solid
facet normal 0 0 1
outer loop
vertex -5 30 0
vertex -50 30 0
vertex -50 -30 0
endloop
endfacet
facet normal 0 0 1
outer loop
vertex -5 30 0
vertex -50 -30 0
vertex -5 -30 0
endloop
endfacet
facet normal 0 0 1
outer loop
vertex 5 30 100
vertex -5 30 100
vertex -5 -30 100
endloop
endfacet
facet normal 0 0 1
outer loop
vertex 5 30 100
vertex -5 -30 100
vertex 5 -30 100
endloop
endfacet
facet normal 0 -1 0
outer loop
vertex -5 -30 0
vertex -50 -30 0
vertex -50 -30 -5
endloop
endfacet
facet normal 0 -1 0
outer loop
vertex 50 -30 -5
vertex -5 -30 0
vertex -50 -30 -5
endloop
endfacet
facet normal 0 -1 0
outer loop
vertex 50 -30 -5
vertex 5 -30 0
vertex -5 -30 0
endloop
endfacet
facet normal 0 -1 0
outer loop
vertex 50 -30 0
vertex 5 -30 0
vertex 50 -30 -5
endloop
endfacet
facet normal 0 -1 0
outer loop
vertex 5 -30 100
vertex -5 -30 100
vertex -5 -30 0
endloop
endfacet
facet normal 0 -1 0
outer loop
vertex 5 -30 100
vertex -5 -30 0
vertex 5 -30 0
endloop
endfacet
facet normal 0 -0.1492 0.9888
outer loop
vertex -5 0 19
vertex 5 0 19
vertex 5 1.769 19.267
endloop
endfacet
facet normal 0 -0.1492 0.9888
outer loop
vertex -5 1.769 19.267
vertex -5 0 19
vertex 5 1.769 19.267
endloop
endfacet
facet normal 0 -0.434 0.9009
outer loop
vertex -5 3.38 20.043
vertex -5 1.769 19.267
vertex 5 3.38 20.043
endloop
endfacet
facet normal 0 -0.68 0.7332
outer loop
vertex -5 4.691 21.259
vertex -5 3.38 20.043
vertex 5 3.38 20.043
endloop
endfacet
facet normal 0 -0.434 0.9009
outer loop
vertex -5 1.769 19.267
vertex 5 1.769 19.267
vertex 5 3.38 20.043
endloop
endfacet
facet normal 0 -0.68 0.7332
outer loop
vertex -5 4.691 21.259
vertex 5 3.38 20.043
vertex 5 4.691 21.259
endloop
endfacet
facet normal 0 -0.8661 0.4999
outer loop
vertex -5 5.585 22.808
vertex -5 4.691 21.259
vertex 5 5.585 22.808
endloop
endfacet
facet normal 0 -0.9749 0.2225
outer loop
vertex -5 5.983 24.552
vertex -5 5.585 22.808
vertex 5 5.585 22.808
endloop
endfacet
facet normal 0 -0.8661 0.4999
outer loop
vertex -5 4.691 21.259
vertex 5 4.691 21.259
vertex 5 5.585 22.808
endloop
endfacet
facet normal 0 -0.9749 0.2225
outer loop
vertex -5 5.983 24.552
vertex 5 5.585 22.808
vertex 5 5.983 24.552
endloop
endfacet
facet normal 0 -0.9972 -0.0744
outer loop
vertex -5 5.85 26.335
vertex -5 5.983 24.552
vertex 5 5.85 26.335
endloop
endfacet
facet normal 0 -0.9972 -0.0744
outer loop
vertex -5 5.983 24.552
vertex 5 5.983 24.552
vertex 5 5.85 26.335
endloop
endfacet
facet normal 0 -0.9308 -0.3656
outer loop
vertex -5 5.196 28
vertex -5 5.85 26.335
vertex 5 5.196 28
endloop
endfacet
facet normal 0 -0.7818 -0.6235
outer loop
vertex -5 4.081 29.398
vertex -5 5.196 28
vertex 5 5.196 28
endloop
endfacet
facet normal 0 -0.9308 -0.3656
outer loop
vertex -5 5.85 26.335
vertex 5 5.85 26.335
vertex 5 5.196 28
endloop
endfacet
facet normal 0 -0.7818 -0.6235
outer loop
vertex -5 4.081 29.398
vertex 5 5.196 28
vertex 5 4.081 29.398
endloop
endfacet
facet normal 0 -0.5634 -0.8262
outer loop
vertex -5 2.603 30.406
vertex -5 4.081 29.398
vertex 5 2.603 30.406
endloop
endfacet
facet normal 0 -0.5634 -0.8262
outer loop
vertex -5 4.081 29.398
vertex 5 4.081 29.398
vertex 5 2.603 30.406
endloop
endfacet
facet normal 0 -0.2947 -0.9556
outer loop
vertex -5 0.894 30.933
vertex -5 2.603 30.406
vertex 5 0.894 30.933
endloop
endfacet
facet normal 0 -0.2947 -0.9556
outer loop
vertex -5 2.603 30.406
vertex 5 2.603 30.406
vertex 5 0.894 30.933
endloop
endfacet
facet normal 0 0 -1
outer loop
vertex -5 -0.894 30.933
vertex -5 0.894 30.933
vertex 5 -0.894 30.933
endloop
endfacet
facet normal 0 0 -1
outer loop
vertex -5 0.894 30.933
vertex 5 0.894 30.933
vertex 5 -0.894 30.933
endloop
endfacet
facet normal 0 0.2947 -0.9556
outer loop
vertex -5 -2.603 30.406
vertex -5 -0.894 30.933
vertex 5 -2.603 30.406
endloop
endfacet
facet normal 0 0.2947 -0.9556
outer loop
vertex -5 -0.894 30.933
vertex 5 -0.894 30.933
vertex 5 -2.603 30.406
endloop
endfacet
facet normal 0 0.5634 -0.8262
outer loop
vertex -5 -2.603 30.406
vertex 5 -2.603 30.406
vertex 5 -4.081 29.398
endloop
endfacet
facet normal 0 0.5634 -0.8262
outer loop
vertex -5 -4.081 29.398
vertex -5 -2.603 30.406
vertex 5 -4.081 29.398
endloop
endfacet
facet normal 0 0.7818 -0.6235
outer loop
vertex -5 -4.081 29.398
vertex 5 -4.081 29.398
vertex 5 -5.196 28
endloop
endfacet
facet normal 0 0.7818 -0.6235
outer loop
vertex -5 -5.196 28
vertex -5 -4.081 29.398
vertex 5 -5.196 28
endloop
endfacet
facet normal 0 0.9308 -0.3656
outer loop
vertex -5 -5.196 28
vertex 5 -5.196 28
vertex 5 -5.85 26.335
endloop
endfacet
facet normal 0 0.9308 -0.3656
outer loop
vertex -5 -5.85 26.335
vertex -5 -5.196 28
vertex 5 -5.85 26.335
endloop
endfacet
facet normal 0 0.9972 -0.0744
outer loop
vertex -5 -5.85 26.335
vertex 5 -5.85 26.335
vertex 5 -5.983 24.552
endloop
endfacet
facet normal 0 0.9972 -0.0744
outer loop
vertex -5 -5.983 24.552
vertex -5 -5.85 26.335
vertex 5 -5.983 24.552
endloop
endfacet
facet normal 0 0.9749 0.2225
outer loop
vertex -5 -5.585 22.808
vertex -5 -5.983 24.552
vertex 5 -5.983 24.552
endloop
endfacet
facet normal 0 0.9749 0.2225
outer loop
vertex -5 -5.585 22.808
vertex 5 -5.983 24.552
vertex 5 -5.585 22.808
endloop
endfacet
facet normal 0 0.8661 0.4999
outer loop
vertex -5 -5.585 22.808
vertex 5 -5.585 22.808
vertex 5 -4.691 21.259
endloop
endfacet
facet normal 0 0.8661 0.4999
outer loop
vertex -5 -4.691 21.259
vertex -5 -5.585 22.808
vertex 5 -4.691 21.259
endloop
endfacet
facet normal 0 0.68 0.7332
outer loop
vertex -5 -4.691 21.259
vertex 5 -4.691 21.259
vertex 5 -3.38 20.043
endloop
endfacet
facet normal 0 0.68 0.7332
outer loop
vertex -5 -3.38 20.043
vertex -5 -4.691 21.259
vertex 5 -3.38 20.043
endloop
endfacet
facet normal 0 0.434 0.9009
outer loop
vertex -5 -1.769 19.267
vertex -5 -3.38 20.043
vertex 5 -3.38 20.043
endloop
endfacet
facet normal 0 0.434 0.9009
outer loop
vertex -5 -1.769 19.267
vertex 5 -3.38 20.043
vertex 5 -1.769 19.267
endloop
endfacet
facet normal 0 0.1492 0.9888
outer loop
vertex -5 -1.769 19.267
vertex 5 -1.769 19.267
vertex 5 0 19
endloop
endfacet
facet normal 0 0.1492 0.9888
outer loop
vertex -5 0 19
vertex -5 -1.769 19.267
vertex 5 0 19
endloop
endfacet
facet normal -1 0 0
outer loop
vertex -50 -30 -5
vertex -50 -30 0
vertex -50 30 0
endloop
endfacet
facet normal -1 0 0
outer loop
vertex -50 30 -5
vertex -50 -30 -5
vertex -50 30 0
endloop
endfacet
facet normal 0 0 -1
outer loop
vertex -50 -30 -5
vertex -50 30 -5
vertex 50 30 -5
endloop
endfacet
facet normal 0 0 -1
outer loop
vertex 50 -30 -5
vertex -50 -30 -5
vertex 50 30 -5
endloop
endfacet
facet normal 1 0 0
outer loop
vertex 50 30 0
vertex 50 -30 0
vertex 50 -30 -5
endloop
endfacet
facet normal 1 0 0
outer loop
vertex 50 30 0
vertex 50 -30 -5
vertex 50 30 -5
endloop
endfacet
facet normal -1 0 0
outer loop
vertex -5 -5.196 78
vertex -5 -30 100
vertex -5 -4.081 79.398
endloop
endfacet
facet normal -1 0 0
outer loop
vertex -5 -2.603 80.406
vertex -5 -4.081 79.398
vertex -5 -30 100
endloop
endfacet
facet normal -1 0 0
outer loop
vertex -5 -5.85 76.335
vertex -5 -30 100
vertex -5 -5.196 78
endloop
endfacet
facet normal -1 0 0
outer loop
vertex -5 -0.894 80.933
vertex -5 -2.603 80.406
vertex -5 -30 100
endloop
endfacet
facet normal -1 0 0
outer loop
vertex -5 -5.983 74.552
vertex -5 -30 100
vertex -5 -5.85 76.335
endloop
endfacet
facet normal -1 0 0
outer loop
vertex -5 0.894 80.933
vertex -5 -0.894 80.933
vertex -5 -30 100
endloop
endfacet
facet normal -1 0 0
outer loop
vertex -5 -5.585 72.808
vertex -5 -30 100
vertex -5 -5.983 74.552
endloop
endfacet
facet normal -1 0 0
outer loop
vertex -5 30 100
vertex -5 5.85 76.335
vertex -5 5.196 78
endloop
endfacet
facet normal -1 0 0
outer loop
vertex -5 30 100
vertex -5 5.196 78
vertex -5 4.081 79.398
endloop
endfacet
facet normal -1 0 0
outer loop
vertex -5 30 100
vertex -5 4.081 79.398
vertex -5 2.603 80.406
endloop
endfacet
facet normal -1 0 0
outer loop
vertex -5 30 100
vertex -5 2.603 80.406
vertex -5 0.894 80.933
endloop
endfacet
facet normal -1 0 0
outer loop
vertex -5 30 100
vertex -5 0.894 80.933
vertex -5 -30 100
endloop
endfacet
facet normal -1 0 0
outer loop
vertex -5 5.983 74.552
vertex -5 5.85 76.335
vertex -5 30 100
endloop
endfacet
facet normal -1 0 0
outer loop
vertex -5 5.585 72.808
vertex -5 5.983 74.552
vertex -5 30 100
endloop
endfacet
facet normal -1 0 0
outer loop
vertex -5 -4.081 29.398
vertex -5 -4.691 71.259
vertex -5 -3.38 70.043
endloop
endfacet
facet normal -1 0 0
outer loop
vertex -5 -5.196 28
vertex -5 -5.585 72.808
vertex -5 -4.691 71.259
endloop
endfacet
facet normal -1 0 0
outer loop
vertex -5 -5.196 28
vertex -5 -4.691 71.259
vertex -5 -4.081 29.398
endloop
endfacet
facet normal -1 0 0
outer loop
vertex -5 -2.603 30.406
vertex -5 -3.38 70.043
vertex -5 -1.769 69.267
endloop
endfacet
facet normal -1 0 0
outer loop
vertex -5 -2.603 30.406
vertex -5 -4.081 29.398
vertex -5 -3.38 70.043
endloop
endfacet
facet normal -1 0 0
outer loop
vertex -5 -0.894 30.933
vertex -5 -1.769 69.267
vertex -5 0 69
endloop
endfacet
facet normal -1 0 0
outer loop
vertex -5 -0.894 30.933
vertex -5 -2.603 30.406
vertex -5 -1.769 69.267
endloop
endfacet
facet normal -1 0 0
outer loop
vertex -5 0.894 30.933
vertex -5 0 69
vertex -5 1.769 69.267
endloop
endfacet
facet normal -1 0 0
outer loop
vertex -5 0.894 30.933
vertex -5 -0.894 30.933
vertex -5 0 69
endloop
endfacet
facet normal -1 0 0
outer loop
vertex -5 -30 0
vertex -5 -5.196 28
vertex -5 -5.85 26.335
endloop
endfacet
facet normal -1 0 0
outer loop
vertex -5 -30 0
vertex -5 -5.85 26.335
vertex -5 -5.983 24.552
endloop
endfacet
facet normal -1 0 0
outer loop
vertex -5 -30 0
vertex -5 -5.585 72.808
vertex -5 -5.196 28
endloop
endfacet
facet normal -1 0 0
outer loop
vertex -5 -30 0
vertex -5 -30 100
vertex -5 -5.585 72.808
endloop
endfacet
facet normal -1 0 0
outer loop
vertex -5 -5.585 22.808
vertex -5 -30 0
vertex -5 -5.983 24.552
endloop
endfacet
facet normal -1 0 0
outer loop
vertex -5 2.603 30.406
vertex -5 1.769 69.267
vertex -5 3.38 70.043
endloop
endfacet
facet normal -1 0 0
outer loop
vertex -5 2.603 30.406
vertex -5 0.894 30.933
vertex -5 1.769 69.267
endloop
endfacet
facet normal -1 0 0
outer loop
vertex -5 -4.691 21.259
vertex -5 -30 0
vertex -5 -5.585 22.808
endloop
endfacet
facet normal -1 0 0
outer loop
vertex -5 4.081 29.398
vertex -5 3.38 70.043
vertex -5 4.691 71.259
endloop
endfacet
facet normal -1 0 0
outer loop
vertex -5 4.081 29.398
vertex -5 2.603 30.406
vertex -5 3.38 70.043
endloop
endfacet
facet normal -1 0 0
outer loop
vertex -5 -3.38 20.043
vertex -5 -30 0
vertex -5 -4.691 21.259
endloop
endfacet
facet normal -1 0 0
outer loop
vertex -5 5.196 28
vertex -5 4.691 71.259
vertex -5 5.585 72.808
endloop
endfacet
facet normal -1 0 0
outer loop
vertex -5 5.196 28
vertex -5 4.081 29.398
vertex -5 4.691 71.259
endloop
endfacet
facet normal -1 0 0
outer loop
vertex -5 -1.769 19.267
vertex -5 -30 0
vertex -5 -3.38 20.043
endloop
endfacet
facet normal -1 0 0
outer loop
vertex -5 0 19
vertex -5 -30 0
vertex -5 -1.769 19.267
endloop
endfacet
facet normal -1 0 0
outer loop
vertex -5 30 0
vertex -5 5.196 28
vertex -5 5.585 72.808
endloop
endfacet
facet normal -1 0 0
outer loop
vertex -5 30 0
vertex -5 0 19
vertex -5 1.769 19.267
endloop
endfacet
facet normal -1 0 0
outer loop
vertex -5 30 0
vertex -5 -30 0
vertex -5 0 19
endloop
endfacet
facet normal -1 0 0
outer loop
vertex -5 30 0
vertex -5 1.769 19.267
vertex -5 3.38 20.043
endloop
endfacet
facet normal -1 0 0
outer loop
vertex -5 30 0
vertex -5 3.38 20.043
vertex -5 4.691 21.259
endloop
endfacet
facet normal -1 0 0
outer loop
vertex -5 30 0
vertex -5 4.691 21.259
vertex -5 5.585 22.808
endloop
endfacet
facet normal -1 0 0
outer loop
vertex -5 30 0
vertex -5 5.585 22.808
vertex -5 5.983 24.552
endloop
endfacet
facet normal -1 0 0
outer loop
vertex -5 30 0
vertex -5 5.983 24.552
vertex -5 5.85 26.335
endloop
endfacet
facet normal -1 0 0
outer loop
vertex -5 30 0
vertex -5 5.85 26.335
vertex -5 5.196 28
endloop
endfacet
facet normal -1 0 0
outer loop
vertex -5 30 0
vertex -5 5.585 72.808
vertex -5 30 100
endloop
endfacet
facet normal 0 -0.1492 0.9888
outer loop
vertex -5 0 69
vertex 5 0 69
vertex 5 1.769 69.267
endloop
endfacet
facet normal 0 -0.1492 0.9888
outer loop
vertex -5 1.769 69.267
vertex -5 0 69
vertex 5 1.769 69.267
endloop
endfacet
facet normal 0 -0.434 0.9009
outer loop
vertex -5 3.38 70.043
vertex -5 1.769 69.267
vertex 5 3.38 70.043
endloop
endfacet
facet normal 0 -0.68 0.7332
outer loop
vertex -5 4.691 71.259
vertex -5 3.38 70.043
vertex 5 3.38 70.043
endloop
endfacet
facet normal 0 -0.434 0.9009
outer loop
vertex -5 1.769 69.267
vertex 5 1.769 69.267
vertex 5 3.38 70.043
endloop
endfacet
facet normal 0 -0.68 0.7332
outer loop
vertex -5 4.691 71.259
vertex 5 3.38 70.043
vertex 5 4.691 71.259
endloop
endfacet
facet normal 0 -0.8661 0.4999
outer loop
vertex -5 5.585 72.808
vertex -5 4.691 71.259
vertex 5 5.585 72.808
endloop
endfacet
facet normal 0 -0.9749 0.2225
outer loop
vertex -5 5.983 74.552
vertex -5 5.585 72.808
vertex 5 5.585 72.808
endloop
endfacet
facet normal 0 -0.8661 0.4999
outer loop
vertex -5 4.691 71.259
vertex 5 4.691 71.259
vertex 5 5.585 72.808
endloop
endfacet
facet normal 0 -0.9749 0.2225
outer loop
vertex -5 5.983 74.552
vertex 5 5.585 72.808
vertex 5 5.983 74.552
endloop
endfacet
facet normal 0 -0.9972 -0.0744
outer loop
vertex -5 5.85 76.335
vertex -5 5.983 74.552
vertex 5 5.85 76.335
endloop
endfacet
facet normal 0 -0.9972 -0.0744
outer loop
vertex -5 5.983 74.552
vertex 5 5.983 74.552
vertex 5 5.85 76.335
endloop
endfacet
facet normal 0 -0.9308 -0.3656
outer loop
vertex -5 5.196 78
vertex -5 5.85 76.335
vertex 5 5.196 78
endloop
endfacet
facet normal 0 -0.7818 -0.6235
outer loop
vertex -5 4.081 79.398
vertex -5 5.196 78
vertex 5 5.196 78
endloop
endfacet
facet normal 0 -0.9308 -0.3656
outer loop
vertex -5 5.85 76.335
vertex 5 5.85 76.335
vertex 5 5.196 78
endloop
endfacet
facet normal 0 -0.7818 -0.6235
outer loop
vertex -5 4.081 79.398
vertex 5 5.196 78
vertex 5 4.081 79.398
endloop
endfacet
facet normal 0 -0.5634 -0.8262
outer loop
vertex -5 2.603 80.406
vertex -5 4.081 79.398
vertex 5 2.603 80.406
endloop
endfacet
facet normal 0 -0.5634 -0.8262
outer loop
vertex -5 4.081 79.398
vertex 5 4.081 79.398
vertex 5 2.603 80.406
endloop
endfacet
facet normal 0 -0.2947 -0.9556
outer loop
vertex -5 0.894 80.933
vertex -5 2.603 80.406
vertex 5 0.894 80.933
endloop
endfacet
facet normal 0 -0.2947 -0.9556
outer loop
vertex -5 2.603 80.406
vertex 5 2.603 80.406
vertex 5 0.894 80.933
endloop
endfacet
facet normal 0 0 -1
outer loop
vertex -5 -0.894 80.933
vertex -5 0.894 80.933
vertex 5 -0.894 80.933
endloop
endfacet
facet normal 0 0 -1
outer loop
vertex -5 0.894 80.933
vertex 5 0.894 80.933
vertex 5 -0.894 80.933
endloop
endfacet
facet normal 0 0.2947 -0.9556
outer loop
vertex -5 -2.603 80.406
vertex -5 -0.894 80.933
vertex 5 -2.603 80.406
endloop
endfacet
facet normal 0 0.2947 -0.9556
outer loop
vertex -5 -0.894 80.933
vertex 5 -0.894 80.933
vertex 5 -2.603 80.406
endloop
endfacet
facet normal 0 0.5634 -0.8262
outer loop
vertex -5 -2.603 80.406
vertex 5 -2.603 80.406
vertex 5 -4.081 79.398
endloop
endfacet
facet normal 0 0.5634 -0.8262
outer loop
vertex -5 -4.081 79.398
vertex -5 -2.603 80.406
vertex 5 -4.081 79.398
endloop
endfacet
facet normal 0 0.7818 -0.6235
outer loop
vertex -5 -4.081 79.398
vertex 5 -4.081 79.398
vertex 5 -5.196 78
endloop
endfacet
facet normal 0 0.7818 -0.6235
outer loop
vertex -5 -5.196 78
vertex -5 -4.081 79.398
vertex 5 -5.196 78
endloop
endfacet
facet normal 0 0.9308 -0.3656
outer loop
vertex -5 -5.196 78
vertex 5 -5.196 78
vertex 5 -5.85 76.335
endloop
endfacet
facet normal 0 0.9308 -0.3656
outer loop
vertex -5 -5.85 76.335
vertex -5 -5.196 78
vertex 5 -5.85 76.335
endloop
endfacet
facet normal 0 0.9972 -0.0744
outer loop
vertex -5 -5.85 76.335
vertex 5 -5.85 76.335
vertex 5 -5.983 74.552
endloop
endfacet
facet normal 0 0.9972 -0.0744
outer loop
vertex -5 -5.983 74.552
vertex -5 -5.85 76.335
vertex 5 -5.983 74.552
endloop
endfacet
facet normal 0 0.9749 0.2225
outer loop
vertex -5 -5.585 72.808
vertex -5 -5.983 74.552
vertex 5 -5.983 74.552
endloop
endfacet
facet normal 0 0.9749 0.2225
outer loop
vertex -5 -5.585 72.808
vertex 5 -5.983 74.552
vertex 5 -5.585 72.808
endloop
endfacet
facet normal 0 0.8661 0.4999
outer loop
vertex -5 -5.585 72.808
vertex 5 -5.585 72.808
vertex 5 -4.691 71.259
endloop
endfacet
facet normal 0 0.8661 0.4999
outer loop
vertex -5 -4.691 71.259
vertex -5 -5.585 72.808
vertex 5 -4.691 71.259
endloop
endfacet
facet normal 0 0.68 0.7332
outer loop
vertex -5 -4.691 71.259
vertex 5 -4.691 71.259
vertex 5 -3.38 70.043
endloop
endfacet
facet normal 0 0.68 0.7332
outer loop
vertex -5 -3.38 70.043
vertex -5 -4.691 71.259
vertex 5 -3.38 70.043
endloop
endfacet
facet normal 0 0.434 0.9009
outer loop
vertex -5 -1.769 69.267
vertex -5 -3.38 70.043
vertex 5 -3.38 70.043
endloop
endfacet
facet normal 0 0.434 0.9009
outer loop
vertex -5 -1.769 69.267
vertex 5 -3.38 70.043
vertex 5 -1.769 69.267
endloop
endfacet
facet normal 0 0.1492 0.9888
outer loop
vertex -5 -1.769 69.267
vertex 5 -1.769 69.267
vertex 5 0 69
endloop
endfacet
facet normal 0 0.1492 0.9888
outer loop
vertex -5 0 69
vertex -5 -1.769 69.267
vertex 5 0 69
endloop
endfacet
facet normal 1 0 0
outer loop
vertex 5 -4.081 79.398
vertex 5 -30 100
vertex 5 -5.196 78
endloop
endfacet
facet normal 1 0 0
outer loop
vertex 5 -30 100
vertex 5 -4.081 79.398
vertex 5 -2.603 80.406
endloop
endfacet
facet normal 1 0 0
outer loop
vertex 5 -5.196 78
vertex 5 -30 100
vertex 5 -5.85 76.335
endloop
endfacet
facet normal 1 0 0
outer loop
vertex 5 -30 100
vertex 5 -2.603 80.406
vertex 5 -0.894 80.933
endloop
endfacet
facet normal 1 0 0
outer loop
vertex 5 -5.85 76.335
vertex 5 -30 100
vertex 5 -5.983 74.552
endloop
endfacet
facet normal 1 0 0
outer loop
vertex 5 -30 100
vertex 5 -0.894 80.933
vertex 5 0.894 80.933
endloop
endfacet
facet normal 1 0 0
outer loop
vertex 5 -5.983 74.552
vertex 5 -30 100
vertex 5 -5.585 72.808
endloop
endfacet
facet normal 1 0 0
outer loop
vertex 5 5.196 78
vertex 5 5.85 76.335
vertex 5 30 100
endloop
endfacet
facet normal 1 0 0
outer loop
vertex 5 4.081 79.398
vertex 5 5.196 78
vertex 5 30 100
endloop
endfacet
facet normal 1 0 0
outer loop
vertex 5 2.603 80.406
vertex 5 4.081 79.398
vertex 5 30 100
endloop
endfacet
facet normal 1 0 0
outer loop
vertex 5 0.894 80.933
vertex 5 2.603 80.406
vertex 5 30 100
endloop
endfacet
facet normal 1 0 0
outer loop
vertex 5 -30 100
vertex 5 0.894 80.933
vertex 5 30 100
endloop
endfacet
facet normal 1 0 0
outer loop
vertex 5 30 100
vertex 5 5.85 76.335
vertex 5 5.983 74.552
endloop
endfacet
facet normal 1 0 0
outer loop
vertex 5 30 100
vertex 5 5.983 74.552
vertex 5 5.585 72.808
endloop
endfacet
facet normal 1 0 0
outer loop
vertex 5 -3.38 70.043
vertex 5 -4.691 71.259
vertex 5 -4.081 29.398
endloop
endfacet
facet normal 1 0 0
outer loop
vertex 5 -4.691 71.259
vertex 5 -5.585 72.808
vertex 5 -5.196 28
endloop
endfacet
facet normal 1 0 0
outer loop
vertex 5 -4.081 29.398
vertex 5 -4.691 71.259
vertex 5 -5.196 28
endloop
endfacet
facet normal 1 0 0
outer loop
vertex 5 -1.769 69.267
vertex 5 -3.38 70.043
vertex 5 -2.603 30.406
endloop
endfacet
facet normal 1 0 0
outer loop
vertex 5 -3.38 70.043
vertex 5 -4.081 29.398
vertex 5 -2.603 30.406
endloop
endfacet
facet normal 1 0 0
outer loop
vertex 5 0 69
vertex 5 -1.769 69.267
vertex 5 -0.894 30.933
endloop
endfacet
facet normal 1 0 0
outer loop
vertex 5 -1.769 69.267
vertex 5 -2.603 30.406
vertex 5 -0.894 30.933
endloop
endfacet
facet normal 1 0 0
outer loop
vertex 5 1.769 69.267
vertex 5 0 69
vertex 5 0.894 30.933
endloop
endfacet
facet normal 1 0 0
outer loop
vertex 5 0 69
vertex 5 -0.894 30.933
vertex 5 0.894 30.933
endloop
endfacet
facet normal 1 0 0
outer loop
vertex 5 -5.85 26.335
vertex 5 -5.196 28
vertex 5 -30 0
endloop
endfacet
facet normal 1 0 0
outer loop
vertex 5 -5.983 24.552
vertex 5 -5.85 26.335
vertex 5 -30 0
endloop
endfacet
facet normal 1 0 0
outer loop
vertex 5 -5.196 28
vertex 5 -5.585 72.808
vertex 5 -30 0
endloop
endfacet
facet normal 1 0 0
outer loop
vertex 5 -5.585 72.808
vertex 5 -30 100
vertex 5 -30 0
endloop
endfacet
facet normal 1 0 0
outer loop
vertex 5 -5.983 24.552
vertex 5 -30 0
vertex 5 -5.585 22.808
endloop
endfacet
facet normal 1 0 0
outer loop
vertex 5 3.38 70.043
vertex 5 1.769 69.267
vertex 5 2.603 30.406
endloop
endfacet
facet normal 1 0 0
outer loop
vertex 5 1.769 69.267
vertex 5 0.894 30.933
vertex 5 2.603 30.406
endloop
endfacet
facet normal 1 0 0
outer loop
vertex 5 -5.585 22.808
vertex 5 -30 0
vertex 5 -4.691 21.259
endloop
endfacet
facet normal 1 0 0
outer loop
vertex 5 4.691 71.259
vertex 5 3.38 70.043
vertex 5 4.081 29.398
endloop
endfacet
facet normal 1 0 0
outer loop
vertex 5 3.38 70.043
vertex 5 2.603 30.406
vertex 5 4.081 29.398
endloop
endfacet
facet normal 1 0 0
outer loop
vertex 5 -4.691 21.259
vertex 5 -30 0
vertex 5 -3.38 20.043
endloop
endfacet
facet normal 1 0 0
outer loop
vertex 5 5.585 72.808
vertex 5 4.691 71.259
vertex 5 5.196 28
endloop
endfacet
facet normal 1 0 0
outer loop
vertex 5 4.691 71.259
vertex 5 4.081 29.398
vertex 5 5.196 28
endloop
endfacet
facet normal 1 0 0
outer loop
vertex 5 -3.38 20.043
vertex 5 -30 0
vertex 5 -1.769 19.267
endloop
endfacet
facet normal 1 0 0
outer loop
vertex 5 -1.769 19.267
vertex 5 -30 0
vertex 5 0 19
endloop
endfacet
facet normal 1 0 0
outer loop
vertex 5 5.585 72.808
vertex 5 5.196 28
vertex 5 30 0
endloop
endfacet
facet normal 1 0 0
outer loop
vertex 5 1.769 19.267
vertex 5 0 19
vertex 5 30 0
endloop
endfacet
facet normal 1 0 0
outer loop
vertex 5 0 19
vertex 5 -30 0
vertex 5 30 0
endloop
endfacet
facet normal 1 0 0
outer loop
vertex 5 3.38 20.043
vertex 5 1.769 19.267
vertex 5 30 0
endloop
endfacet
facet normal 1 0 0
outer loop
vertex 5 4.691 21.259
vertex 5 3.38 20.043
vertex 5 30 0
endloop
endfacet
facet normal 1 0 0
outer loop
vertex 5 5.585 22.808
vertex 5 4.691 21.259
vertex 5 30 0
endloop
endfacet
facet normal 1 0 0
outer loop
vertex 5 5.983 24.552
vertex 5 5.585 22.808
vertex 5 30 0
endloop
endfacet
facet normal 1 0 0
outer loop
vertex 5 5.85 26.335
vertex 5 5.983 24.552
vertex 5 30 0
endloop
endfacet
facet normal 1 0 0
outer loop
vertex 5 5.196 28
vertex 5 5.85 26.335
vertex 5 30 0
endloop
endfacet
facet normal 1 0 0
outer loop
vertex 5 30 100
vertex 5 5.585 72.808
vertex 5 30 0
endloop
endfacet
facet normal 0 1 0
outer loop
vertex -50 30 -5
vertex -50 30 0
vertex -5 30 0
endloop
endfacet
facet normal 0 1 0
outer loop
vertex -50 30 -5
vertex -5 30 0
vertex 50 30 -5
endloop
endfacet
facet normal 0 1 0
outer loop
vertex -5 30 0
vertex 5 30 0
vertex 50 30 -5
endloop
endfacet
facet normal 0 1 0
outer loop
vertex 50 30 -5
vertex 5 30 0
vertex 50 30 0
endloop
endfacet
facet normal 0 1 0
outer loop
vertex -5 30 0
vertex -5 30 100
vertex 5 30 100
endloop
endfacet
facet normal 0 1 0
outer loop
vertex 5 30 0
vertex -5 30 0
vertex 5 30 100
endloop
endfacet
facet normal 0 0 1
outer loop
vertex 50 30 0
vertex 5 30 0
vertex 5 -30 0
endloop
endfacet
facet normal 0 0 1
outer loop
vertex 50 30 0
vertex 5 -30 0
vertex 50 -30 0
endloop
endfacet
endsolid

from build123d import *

# Parameters (mm, degrees)
CROQUIS3_W              = 100
CROQUIS3_H              = 60
SALIENTE_EXTRUIR1_DEPTH = 5
CROQUIS3_3_W            = 10
CROQUIS3_3_H            = 60
SALIENTE_EXTRUIR2_DEPTH = 100
CROQUIS5_R              = 6
CORTAR_EXTRUIR1_DEPTH   = 20


with BuildPart() as part:
    # Croquis3 → Saliente-Extruir1 (new body)
    with BuildSketch(Plane.XY):
        Rectangle(CROQUIS3_W, CROQUIS3_H)
    extrude(amount=-SALIENTE_EXTRUIR1_DEPTH)

    # Croquis3<3> → Saliente-Extruir2 (add)
    with BuildSketch(Plane.XY):
        Rectangle(CROQUIS3_3_W, CROQUIS3_3_H)
    extrude(amount=SALIENTE_EXTRUIR2_DEPTH)

    # Croquis5 → Cortar-Extruir1 (cut)
    with BuildSketch(Plane(origin=(5, 0, 0), x_dir=(0, 0, -1), z_dir=(1, 0, 0))):
        with Locations((-75, 0)):
            Circle(CROQUIS5_R)
        with Locations((-25, 0)):
            Circle(CROQUIS5_R)
    extrude(amount=-CORTAR_EXTRUIR1_DEPTH, mode=Mode.SUBTRACT)


solid = part.part
